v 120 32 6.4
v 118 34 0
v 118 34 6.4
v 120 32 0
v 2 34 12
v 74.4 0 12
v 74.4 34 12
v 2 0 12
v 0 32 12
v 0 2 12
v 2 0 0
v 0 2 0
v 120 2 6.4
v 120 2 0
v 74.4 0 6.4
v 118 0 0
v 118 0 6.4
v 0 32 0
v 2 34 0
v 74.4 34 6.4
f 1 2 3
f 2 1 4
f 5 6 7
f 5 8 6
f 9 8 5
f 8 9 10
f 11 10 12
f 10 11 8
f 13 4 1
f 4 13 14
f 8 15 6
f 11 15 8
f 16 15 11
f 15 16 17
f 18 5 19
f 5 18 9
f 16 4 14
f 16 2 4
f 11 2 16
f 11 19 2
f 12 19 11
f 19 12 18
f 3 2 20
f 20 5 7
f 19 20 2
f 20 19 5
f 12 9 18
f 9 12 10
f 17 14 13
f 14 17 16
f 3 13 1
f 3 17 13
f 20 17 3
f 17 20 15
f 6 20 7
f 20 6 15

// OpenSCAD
$fn = 32;

// ----------------------------------------------------------------------
// Stepped bar: endstep, 120 x 34 x 12/6.4 mm
// ----------------------------------------------------------------------

// --- parameters (mm) ---
bar_l = 120;              // bar length, X
bar_w = 34;               // bar width, Y
plate_t = 12;             // thickness of the thick zone, Z
thin_t = 6.4;             // thickness of the thin zone
corner_c = 2;             // corner chamfer of the bar
step_cut = 5.6;           // material removed from the thin zone
step_x = 74.4;            // step position from the left end
depth_1 = 5.6;            // depth of cut 1 from the top face
fit_tol = 0.1;            // declared fit tolerance (prompt contract)
free_tol = 0.3;           // declared free tolerance (prompt contract)

profile = [[2, 0], [118, 0], [120, 2], [120, 32], [118, 34], [2, 34], [0, 32], [0, 2]];  // primary outline, 8 points, counter clockwise
void_1 = [[74.4, -1], [121, -1], [121, 35], [74.4, 35]];  // thin zone beyond the step, 4 points

// --- the one profile operation ---
difference() {
  linear_extrude(height = plate_t) polygon(points = profile);
  translate([0, 0, plate_t - depth_1])
    linear_extrude(height = depth_1 + 1) polygon(points = void_1);
}
